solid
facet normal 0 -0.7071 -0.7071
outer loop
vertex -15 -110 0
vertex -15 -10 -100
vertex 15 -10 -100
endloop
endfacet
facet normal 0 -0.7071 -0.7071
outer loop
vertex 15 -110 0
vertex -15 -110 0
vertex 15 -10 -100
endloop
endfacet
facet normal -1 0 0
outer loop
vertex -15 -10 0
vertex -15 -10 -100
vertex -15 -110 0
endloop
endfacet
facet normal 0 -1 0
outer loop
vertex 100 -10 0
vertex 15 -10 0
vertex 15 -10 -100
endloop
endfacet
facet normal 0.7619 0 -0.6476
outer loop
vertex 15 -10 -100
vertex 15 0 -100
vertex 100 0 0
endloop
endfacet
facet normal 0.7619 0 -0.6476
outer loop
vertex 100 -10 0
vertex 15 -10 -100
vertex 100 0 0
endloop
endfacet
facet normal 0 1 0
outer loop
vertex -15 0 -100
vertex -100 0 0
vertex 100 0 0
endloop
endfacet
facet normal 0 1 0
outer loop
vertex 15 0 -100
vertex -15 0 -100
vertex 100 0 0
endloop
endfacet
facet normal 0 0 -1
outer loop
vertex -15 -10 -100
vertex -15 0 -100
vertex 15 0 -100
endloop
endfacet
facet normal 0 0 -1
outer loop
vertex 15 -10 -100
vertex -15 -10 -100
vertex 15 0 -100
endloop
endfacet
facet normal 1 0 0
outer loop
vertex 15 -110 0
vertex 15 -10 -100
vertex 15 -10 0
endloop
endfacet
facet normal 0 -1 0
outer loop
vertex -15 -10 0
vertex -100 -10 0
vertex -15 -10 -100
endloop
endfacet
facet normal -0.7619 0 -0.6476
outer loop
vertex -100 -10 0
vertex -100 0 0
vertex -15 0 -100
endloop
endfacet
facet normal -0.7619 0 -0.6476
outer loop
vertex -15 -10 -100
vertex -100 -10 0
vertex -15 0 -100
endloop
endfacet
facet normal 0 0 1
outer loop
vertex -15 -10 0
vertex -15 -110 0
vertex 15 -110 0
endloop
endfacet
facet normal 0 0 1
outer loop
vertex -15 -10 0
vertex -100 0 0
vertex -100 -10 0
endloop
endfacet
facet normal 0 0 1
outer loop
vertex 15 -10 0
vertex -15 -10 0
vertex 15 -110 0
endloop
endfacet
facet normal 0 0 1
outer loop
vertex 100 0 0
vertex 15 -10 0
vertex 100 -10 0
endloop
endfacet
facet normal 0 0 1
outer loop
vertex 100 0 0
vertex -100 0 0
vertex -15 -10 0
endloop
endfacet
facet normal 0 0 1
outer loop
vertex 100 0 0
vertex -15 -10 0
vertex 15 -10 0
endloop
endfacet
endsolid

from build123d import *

# Parameters (mm, degrees)
F1_DEPTH = 10
F2_W     = 30
F2_H     = 100
F3_DEPTH = 100
F4_SIZE  = 99.99999


# Not quite as in the source:
# - a fillet or chamfer is up to 0.001 mm smaller than in the source, because OpenCascade refuses the exact size


with BuildPart() as f1:
    # F0 (on Front) → F1 (new body)
    with BuildSketch(Plane.XZ):
        Polygon((0, -100), (0, 0), (-100, 0), (-15, -100), align=None)
        Polygon((100, 0), (0, 0), (0, -100), (15, -100), align=None)
    extrude(amount=F1_DEPTH)

    # F2 (on face) → F3 (join)
    with BuildSketch(Plane.XZ.offset(10)):
        with Locations((0, -50)):
            Rectangle(F2_W, F2_H)
    extrude(amount=F3_DEPTH)

    # F4 (size 100 in the source; OpenCascade refuses exactly that, so slightly less here)
    f4_edges = [f1.edges().sort_by_distance(p)[0] for p in [
        (0, -110, -100),
    ]]
    chamfer(f4_edges, length=F4_SIZE)


solid = f1.part
